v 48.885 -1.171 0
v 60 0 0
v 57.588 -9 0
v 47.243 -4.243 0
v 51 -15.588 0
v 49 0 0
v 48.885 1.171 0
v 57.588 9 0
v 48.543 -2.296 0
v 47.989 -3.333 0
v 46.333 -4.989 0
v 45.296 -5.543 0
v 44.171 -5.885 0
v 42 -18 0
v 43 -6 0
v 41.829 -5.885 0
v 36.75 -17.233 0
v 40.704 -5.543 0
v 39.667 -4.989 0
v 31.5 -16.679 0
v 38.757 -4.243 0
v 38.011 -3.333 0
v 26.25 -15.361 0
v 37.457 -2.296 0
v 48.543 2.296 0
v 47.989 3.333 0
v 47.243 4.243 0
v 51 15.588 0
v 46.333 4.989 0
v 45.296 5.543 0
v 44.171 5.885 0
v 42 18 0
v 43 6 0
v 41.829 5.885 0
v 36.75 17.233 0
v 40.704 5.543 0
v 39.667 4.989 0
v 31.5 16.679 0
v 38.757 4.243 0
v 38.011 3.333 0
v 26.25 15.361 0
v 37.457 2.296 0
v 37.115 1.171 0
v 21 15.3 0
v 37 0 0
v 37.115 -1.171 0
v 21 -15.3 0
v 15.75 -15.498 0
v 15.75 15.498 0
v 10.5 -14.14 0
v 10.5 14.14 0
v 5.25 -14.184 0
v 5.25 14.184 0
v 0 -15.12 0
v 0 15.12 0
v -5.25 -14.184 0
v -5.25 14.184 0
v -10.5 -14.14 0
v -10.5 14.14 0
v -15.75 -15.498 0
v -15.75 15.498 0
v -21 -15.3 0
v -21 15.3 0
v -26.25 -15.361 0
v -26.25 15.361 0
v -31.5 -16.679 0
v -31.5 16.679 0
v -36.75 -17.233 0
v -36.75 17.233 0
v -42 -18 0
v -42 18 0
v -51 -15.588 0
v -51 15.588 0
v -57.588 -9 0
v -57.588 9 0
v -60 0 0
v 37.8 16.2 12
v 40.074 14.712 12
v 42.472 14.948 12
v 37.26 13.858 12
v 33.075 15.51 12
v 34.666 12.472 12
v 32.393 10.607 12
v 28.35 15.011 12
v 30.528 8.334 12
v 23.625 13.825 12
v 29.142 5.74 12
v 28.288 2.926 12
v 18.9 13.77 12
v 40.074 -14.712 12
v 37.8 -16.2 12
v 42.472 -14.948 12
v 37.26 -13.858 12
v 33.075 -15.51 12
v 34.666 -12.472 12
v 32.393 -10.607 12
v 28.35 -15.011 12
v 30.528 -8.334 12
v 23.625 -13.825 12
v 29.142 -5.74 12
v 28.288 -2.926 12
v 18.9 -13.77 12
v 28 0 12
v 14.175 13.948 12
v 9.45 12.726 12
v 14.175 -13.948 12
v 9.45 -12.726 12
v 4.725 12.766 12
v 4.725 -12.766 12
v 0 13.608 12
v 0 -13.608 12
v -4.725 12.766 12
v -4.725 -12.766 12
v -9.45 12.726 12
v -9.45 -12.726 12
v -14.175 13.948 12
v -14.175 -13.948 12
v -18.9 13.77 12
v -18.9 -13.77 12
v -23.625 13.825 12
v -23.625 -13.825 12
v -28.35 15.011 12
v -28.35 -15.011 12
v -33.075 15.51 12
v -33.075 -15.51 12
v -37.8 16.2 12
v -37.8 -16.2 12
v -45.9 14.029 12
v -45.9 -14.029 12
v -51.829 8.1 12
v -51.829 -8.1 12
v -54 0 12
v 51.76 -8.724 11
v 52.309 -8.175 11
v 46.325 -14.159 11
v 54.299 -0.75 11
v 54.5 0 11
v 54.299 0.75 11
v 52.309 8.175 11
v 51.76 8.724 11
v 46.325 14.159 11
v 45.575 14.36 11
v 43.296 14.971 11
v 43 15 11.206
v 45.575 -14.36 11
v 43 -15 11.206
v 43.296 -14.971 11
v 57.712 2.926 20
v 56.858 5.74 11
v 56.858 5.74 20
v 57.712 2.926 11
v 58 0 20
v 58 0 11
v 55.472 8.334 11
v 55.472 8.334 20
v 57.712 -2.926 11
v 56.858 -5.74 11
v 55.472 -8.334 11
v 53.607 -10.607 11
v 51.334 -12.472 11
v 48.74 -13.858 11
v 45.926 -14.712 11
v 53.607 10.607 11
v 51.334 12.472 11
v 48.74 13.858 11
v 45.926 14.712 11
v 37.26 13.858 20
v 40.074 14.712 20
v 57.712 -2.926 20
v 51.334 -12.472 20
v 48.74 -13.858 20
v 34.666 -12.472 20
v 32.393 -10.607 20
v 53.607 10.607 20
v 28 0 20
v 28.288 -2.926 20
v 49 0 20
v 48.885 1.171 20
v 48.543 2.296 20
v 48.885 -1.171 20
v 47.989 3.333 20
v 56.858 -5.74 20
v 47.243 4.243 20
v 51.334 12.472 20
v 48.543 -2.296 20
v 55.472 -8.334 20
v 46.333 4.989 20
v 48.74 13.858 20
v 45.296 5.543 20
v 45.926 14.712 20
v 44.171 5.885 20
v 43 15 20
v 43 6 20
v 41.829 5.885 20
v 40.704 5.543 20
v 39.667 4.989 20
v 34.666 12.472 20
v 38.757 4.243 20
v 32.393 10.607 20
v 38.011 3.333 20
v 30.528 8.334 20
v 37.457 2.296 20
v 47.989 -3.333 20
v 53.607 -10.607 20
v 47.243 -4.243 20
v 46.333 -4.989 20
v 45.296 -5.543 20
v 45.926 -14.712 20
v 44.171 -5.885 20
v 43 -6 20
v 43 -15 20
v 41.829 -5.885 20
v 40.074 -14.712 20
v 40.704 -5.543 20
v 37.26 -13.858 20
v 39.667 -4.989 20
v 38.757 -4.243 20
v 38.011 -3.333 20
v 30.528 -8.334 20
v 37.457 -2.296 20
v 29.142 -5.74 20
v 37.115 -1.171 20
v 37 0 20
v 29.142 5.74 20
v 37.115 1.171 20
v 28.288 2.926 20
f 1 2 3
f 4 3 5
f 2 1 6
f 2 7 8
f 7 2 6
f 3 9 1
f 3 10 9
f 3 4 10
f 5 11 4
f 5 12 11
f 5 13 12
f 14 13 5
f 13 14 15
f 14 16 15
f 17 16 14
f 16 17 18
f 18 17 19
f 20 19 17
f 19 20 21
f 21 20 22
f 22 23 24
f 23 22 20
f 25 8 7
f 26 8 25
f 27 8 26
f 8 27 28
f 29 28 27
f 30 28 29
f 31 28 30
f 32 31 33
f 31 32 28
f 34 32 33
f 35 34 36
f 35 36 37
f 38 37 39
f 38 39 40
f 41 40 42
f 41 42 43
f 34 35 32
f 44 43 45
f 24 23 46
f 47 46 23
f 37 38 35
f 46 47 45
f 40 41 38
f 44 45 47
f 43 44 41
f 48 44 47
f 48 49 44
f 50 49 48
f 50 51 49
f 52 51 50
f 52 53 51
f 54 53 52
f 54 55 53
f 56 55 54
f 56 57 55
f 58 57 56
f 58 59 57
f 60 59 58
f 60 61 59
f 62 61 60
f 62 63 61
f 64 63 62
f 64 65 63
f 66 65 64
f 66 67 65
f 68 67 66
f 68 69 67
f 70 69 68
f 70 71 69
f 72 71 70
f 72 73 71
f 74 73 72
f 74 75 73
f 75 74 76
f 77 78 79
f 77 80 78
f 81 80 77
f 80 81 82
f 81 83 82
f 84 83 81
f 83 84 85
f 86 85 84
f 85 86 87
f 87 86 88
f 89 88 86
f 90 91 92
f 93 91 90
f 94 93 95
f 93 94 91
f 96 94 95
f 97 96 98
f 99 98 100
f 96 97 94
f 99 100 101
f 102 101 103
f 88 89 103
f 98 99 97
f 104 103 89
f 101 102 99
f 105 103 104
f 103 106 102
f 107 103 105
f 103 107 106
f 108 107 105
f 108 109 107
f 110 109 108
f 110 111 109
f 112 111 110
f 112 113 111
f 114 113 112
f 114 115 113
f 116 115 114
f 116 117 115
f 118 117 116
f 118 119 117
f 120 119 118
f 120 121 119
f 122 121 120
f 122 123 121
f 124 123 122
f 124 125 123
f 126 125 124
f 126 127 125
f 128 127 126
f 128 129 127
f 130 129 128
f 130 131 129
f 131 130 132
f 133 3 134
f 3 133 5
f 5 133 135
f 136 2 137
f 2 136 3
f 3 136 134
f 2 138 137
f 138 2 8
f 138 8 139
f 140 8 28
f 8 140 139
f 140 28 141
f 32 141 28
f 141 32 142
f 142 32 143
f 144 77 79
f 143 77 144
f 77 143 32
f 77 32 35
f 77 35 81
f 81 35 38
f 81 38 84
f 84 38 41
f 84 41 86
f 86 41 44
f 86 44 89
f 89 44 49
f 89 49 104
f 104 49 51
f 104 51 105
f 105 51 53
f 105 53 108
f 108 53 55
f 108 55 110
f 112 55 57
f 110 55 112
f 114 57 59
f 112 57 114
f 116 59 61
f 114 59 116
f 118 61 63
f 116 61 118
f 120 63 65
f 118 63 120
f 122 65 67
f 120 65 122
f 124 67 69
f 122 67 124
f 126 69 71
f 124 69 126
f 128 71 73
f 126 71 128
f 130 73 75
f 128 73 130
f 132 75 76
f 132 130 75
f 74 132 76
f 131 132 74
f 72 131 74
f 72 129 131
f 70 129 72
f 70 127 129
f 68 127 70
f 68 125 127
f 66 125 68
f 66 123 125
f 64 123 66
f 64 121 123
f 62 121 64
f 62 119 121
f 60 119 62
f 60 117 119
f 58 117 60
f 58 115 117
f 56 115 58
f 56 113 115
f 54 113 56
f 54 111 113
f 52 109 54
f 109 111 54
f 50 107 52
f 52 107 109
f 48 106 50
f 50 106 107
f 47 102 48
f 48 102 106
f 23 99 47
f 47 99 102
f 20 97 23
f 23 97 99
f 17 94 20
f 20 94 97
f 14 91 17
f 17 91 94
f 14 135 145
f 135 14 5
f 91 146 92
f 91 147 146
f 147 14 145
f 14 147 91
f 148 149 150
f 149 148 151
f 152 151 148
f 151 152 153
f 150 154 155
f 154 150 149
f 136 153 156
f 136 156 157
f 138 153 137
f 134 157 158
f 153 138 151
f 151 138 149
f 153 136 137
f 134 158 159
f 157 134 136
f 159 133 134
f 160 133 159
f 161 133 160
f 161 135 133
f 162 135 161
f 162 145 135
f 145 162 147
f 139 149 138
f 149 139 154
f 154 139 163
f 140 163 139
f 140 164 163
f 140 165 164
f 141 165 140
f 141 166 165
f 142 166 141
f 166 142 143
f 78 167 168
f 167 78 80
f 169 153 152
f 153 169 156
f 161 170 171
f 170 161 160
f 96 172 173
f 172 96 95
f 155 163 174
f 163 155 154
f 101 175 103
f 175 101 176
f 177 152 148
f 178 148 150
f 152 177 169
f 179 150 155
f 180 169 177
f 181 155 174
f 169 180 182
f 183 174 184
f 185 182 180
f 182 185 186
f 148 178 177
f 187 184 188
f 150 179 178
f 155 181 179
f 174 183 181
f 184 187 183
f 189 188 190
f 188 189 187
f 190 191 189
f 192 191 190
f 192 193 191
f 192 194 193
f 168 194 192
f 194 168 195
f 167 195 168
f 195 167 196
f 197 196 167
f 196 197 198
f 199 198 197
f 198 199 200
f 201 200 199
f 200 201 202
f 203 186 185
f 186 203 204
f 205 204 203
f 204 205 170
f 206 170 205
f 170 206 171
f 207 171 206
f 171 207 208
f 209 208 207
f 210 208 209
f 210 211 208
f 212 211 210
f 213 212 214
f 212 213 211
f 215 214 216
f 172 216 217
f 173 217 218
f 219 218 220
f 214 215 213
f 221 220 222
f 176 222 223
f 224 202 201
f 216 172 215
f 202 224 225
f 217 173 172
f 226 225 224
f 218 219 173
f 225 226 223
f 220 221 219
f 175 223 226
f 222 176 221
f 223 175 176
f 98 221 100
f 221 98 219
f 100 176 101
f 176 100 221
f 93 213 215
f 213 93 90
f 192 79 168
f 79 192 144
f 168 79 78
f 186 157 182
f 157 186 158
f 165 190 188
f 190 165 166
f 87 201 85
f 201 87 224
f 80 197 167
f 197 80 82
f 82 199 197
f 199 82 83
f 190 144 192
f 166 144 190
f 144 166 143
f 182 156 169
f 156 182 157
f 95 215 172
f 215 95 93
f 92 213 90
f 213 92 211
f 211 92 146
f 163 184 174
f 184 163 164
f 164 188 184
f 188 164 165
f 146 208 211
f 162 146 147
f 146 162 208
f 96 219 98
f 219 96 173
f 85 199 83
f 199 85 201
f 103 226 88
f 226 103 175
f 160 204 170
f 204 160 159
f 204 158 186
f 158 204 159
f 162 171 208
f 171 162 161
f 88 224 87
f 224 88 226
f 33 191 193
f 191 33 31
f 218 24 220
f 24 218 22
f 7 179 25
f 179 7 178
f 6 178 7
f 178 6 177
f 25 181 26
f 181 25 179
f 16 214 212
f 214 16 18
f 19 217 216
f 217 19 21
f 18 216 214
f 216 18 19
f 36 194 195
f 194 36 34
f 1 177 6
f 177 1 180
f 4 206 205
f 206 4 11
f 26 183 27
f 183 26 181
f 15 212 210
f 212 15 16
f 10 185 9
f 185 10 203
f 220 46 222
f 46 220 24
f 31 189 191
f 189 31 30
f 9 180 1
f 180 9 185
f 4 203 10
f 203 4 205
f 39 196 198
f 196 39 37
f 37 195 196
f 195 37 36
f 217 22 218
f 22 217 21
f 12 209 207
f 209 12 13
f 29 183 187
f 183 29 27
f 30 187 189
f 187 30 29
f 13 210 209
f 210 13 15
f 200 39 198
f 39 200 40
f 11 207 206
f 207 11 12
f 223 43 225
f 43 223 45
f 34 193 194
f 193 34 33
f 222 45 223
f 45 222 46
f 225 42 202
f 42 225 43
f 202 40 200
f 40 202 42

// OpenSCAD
$fn = 32;

// ----------------------------------------------------------------------
// Handle: 120 x 36 mm grip, 12 mm thick
// ----------------------------------------------------------------------

// --- parameters (mm) ---
length = 120;             // grip length
width = 36;               // grip width
thickness = 12;           // grip thickness
waist = 0.8;              // width factor at the middle
draft = 0.9;              // top face scale of the extrusion
scallops = 5;             // finger rests per side
ripple = 0.05;            // depth factor of the finger rests
boss_d = 30;              // mounting boss diameter
boss_h = 8;               // mounting boss height
boss_hole_d = 12;         // screw clearance through the boss
boss_r = 43;              // boss centre from the grip centre

/* ergonomic grip outline, closed spline-like polygon in the XY plane */
grip = [[-42, 18], [-36.75, 17.233], [-31.5, 16.679], [-26.25, 15.361], [-21, 15.3], [-15.75, 15.498], [-10.5, 14.14], [-5.25, 14.184], [0, 15.12], [5.25, 14.184], [10.5, 14.14], [15.75, 15.498], [21, 15.3], [26.25, 15.361], [31.5, 16.679], [36.75, 17.233], [42, 18], [51, 15.588], [57.588, 9], [60, 0], [57.588, -9], [51, -15.588], [42, -18], [42, -18], [36.75, -17.233], [31.5, -16.679], [26.25, -15.361], [21, -15.3], [15.75, -15.498], [10.5, -14.14], [5.25, -14.184], [0, -15.12], [-5.25, -14.184], [-10.5, -14.14], [-15.75, -15.498], [-21, -15.3], [-26.25, -15.361], [-31.5, -16.679], [-36.75, -17.233], [-42, -18], [-51, -15.588], [-57.588, -9], [-60, 0], [-57.588, 9], [-51, 15.588], [-42, 18]];

module grip_body() {
  linear_extrude(height = thickness, scale = draft) polygon(grip);
}

module boss_body() {
  /* sunk 1 mm into the grip so the joint overlaps */
  translate([boss_r, 0, thickness - 1]) cylinder(h = boss_h + 1, d = boss_d);
}

difference() {
  union() {
    grip_body();
    boss_body();
  }
  translate([boss_r, 0, -1]) cylinder(h = thickness + boss_h + 2, d = boss_hole_d);
}
